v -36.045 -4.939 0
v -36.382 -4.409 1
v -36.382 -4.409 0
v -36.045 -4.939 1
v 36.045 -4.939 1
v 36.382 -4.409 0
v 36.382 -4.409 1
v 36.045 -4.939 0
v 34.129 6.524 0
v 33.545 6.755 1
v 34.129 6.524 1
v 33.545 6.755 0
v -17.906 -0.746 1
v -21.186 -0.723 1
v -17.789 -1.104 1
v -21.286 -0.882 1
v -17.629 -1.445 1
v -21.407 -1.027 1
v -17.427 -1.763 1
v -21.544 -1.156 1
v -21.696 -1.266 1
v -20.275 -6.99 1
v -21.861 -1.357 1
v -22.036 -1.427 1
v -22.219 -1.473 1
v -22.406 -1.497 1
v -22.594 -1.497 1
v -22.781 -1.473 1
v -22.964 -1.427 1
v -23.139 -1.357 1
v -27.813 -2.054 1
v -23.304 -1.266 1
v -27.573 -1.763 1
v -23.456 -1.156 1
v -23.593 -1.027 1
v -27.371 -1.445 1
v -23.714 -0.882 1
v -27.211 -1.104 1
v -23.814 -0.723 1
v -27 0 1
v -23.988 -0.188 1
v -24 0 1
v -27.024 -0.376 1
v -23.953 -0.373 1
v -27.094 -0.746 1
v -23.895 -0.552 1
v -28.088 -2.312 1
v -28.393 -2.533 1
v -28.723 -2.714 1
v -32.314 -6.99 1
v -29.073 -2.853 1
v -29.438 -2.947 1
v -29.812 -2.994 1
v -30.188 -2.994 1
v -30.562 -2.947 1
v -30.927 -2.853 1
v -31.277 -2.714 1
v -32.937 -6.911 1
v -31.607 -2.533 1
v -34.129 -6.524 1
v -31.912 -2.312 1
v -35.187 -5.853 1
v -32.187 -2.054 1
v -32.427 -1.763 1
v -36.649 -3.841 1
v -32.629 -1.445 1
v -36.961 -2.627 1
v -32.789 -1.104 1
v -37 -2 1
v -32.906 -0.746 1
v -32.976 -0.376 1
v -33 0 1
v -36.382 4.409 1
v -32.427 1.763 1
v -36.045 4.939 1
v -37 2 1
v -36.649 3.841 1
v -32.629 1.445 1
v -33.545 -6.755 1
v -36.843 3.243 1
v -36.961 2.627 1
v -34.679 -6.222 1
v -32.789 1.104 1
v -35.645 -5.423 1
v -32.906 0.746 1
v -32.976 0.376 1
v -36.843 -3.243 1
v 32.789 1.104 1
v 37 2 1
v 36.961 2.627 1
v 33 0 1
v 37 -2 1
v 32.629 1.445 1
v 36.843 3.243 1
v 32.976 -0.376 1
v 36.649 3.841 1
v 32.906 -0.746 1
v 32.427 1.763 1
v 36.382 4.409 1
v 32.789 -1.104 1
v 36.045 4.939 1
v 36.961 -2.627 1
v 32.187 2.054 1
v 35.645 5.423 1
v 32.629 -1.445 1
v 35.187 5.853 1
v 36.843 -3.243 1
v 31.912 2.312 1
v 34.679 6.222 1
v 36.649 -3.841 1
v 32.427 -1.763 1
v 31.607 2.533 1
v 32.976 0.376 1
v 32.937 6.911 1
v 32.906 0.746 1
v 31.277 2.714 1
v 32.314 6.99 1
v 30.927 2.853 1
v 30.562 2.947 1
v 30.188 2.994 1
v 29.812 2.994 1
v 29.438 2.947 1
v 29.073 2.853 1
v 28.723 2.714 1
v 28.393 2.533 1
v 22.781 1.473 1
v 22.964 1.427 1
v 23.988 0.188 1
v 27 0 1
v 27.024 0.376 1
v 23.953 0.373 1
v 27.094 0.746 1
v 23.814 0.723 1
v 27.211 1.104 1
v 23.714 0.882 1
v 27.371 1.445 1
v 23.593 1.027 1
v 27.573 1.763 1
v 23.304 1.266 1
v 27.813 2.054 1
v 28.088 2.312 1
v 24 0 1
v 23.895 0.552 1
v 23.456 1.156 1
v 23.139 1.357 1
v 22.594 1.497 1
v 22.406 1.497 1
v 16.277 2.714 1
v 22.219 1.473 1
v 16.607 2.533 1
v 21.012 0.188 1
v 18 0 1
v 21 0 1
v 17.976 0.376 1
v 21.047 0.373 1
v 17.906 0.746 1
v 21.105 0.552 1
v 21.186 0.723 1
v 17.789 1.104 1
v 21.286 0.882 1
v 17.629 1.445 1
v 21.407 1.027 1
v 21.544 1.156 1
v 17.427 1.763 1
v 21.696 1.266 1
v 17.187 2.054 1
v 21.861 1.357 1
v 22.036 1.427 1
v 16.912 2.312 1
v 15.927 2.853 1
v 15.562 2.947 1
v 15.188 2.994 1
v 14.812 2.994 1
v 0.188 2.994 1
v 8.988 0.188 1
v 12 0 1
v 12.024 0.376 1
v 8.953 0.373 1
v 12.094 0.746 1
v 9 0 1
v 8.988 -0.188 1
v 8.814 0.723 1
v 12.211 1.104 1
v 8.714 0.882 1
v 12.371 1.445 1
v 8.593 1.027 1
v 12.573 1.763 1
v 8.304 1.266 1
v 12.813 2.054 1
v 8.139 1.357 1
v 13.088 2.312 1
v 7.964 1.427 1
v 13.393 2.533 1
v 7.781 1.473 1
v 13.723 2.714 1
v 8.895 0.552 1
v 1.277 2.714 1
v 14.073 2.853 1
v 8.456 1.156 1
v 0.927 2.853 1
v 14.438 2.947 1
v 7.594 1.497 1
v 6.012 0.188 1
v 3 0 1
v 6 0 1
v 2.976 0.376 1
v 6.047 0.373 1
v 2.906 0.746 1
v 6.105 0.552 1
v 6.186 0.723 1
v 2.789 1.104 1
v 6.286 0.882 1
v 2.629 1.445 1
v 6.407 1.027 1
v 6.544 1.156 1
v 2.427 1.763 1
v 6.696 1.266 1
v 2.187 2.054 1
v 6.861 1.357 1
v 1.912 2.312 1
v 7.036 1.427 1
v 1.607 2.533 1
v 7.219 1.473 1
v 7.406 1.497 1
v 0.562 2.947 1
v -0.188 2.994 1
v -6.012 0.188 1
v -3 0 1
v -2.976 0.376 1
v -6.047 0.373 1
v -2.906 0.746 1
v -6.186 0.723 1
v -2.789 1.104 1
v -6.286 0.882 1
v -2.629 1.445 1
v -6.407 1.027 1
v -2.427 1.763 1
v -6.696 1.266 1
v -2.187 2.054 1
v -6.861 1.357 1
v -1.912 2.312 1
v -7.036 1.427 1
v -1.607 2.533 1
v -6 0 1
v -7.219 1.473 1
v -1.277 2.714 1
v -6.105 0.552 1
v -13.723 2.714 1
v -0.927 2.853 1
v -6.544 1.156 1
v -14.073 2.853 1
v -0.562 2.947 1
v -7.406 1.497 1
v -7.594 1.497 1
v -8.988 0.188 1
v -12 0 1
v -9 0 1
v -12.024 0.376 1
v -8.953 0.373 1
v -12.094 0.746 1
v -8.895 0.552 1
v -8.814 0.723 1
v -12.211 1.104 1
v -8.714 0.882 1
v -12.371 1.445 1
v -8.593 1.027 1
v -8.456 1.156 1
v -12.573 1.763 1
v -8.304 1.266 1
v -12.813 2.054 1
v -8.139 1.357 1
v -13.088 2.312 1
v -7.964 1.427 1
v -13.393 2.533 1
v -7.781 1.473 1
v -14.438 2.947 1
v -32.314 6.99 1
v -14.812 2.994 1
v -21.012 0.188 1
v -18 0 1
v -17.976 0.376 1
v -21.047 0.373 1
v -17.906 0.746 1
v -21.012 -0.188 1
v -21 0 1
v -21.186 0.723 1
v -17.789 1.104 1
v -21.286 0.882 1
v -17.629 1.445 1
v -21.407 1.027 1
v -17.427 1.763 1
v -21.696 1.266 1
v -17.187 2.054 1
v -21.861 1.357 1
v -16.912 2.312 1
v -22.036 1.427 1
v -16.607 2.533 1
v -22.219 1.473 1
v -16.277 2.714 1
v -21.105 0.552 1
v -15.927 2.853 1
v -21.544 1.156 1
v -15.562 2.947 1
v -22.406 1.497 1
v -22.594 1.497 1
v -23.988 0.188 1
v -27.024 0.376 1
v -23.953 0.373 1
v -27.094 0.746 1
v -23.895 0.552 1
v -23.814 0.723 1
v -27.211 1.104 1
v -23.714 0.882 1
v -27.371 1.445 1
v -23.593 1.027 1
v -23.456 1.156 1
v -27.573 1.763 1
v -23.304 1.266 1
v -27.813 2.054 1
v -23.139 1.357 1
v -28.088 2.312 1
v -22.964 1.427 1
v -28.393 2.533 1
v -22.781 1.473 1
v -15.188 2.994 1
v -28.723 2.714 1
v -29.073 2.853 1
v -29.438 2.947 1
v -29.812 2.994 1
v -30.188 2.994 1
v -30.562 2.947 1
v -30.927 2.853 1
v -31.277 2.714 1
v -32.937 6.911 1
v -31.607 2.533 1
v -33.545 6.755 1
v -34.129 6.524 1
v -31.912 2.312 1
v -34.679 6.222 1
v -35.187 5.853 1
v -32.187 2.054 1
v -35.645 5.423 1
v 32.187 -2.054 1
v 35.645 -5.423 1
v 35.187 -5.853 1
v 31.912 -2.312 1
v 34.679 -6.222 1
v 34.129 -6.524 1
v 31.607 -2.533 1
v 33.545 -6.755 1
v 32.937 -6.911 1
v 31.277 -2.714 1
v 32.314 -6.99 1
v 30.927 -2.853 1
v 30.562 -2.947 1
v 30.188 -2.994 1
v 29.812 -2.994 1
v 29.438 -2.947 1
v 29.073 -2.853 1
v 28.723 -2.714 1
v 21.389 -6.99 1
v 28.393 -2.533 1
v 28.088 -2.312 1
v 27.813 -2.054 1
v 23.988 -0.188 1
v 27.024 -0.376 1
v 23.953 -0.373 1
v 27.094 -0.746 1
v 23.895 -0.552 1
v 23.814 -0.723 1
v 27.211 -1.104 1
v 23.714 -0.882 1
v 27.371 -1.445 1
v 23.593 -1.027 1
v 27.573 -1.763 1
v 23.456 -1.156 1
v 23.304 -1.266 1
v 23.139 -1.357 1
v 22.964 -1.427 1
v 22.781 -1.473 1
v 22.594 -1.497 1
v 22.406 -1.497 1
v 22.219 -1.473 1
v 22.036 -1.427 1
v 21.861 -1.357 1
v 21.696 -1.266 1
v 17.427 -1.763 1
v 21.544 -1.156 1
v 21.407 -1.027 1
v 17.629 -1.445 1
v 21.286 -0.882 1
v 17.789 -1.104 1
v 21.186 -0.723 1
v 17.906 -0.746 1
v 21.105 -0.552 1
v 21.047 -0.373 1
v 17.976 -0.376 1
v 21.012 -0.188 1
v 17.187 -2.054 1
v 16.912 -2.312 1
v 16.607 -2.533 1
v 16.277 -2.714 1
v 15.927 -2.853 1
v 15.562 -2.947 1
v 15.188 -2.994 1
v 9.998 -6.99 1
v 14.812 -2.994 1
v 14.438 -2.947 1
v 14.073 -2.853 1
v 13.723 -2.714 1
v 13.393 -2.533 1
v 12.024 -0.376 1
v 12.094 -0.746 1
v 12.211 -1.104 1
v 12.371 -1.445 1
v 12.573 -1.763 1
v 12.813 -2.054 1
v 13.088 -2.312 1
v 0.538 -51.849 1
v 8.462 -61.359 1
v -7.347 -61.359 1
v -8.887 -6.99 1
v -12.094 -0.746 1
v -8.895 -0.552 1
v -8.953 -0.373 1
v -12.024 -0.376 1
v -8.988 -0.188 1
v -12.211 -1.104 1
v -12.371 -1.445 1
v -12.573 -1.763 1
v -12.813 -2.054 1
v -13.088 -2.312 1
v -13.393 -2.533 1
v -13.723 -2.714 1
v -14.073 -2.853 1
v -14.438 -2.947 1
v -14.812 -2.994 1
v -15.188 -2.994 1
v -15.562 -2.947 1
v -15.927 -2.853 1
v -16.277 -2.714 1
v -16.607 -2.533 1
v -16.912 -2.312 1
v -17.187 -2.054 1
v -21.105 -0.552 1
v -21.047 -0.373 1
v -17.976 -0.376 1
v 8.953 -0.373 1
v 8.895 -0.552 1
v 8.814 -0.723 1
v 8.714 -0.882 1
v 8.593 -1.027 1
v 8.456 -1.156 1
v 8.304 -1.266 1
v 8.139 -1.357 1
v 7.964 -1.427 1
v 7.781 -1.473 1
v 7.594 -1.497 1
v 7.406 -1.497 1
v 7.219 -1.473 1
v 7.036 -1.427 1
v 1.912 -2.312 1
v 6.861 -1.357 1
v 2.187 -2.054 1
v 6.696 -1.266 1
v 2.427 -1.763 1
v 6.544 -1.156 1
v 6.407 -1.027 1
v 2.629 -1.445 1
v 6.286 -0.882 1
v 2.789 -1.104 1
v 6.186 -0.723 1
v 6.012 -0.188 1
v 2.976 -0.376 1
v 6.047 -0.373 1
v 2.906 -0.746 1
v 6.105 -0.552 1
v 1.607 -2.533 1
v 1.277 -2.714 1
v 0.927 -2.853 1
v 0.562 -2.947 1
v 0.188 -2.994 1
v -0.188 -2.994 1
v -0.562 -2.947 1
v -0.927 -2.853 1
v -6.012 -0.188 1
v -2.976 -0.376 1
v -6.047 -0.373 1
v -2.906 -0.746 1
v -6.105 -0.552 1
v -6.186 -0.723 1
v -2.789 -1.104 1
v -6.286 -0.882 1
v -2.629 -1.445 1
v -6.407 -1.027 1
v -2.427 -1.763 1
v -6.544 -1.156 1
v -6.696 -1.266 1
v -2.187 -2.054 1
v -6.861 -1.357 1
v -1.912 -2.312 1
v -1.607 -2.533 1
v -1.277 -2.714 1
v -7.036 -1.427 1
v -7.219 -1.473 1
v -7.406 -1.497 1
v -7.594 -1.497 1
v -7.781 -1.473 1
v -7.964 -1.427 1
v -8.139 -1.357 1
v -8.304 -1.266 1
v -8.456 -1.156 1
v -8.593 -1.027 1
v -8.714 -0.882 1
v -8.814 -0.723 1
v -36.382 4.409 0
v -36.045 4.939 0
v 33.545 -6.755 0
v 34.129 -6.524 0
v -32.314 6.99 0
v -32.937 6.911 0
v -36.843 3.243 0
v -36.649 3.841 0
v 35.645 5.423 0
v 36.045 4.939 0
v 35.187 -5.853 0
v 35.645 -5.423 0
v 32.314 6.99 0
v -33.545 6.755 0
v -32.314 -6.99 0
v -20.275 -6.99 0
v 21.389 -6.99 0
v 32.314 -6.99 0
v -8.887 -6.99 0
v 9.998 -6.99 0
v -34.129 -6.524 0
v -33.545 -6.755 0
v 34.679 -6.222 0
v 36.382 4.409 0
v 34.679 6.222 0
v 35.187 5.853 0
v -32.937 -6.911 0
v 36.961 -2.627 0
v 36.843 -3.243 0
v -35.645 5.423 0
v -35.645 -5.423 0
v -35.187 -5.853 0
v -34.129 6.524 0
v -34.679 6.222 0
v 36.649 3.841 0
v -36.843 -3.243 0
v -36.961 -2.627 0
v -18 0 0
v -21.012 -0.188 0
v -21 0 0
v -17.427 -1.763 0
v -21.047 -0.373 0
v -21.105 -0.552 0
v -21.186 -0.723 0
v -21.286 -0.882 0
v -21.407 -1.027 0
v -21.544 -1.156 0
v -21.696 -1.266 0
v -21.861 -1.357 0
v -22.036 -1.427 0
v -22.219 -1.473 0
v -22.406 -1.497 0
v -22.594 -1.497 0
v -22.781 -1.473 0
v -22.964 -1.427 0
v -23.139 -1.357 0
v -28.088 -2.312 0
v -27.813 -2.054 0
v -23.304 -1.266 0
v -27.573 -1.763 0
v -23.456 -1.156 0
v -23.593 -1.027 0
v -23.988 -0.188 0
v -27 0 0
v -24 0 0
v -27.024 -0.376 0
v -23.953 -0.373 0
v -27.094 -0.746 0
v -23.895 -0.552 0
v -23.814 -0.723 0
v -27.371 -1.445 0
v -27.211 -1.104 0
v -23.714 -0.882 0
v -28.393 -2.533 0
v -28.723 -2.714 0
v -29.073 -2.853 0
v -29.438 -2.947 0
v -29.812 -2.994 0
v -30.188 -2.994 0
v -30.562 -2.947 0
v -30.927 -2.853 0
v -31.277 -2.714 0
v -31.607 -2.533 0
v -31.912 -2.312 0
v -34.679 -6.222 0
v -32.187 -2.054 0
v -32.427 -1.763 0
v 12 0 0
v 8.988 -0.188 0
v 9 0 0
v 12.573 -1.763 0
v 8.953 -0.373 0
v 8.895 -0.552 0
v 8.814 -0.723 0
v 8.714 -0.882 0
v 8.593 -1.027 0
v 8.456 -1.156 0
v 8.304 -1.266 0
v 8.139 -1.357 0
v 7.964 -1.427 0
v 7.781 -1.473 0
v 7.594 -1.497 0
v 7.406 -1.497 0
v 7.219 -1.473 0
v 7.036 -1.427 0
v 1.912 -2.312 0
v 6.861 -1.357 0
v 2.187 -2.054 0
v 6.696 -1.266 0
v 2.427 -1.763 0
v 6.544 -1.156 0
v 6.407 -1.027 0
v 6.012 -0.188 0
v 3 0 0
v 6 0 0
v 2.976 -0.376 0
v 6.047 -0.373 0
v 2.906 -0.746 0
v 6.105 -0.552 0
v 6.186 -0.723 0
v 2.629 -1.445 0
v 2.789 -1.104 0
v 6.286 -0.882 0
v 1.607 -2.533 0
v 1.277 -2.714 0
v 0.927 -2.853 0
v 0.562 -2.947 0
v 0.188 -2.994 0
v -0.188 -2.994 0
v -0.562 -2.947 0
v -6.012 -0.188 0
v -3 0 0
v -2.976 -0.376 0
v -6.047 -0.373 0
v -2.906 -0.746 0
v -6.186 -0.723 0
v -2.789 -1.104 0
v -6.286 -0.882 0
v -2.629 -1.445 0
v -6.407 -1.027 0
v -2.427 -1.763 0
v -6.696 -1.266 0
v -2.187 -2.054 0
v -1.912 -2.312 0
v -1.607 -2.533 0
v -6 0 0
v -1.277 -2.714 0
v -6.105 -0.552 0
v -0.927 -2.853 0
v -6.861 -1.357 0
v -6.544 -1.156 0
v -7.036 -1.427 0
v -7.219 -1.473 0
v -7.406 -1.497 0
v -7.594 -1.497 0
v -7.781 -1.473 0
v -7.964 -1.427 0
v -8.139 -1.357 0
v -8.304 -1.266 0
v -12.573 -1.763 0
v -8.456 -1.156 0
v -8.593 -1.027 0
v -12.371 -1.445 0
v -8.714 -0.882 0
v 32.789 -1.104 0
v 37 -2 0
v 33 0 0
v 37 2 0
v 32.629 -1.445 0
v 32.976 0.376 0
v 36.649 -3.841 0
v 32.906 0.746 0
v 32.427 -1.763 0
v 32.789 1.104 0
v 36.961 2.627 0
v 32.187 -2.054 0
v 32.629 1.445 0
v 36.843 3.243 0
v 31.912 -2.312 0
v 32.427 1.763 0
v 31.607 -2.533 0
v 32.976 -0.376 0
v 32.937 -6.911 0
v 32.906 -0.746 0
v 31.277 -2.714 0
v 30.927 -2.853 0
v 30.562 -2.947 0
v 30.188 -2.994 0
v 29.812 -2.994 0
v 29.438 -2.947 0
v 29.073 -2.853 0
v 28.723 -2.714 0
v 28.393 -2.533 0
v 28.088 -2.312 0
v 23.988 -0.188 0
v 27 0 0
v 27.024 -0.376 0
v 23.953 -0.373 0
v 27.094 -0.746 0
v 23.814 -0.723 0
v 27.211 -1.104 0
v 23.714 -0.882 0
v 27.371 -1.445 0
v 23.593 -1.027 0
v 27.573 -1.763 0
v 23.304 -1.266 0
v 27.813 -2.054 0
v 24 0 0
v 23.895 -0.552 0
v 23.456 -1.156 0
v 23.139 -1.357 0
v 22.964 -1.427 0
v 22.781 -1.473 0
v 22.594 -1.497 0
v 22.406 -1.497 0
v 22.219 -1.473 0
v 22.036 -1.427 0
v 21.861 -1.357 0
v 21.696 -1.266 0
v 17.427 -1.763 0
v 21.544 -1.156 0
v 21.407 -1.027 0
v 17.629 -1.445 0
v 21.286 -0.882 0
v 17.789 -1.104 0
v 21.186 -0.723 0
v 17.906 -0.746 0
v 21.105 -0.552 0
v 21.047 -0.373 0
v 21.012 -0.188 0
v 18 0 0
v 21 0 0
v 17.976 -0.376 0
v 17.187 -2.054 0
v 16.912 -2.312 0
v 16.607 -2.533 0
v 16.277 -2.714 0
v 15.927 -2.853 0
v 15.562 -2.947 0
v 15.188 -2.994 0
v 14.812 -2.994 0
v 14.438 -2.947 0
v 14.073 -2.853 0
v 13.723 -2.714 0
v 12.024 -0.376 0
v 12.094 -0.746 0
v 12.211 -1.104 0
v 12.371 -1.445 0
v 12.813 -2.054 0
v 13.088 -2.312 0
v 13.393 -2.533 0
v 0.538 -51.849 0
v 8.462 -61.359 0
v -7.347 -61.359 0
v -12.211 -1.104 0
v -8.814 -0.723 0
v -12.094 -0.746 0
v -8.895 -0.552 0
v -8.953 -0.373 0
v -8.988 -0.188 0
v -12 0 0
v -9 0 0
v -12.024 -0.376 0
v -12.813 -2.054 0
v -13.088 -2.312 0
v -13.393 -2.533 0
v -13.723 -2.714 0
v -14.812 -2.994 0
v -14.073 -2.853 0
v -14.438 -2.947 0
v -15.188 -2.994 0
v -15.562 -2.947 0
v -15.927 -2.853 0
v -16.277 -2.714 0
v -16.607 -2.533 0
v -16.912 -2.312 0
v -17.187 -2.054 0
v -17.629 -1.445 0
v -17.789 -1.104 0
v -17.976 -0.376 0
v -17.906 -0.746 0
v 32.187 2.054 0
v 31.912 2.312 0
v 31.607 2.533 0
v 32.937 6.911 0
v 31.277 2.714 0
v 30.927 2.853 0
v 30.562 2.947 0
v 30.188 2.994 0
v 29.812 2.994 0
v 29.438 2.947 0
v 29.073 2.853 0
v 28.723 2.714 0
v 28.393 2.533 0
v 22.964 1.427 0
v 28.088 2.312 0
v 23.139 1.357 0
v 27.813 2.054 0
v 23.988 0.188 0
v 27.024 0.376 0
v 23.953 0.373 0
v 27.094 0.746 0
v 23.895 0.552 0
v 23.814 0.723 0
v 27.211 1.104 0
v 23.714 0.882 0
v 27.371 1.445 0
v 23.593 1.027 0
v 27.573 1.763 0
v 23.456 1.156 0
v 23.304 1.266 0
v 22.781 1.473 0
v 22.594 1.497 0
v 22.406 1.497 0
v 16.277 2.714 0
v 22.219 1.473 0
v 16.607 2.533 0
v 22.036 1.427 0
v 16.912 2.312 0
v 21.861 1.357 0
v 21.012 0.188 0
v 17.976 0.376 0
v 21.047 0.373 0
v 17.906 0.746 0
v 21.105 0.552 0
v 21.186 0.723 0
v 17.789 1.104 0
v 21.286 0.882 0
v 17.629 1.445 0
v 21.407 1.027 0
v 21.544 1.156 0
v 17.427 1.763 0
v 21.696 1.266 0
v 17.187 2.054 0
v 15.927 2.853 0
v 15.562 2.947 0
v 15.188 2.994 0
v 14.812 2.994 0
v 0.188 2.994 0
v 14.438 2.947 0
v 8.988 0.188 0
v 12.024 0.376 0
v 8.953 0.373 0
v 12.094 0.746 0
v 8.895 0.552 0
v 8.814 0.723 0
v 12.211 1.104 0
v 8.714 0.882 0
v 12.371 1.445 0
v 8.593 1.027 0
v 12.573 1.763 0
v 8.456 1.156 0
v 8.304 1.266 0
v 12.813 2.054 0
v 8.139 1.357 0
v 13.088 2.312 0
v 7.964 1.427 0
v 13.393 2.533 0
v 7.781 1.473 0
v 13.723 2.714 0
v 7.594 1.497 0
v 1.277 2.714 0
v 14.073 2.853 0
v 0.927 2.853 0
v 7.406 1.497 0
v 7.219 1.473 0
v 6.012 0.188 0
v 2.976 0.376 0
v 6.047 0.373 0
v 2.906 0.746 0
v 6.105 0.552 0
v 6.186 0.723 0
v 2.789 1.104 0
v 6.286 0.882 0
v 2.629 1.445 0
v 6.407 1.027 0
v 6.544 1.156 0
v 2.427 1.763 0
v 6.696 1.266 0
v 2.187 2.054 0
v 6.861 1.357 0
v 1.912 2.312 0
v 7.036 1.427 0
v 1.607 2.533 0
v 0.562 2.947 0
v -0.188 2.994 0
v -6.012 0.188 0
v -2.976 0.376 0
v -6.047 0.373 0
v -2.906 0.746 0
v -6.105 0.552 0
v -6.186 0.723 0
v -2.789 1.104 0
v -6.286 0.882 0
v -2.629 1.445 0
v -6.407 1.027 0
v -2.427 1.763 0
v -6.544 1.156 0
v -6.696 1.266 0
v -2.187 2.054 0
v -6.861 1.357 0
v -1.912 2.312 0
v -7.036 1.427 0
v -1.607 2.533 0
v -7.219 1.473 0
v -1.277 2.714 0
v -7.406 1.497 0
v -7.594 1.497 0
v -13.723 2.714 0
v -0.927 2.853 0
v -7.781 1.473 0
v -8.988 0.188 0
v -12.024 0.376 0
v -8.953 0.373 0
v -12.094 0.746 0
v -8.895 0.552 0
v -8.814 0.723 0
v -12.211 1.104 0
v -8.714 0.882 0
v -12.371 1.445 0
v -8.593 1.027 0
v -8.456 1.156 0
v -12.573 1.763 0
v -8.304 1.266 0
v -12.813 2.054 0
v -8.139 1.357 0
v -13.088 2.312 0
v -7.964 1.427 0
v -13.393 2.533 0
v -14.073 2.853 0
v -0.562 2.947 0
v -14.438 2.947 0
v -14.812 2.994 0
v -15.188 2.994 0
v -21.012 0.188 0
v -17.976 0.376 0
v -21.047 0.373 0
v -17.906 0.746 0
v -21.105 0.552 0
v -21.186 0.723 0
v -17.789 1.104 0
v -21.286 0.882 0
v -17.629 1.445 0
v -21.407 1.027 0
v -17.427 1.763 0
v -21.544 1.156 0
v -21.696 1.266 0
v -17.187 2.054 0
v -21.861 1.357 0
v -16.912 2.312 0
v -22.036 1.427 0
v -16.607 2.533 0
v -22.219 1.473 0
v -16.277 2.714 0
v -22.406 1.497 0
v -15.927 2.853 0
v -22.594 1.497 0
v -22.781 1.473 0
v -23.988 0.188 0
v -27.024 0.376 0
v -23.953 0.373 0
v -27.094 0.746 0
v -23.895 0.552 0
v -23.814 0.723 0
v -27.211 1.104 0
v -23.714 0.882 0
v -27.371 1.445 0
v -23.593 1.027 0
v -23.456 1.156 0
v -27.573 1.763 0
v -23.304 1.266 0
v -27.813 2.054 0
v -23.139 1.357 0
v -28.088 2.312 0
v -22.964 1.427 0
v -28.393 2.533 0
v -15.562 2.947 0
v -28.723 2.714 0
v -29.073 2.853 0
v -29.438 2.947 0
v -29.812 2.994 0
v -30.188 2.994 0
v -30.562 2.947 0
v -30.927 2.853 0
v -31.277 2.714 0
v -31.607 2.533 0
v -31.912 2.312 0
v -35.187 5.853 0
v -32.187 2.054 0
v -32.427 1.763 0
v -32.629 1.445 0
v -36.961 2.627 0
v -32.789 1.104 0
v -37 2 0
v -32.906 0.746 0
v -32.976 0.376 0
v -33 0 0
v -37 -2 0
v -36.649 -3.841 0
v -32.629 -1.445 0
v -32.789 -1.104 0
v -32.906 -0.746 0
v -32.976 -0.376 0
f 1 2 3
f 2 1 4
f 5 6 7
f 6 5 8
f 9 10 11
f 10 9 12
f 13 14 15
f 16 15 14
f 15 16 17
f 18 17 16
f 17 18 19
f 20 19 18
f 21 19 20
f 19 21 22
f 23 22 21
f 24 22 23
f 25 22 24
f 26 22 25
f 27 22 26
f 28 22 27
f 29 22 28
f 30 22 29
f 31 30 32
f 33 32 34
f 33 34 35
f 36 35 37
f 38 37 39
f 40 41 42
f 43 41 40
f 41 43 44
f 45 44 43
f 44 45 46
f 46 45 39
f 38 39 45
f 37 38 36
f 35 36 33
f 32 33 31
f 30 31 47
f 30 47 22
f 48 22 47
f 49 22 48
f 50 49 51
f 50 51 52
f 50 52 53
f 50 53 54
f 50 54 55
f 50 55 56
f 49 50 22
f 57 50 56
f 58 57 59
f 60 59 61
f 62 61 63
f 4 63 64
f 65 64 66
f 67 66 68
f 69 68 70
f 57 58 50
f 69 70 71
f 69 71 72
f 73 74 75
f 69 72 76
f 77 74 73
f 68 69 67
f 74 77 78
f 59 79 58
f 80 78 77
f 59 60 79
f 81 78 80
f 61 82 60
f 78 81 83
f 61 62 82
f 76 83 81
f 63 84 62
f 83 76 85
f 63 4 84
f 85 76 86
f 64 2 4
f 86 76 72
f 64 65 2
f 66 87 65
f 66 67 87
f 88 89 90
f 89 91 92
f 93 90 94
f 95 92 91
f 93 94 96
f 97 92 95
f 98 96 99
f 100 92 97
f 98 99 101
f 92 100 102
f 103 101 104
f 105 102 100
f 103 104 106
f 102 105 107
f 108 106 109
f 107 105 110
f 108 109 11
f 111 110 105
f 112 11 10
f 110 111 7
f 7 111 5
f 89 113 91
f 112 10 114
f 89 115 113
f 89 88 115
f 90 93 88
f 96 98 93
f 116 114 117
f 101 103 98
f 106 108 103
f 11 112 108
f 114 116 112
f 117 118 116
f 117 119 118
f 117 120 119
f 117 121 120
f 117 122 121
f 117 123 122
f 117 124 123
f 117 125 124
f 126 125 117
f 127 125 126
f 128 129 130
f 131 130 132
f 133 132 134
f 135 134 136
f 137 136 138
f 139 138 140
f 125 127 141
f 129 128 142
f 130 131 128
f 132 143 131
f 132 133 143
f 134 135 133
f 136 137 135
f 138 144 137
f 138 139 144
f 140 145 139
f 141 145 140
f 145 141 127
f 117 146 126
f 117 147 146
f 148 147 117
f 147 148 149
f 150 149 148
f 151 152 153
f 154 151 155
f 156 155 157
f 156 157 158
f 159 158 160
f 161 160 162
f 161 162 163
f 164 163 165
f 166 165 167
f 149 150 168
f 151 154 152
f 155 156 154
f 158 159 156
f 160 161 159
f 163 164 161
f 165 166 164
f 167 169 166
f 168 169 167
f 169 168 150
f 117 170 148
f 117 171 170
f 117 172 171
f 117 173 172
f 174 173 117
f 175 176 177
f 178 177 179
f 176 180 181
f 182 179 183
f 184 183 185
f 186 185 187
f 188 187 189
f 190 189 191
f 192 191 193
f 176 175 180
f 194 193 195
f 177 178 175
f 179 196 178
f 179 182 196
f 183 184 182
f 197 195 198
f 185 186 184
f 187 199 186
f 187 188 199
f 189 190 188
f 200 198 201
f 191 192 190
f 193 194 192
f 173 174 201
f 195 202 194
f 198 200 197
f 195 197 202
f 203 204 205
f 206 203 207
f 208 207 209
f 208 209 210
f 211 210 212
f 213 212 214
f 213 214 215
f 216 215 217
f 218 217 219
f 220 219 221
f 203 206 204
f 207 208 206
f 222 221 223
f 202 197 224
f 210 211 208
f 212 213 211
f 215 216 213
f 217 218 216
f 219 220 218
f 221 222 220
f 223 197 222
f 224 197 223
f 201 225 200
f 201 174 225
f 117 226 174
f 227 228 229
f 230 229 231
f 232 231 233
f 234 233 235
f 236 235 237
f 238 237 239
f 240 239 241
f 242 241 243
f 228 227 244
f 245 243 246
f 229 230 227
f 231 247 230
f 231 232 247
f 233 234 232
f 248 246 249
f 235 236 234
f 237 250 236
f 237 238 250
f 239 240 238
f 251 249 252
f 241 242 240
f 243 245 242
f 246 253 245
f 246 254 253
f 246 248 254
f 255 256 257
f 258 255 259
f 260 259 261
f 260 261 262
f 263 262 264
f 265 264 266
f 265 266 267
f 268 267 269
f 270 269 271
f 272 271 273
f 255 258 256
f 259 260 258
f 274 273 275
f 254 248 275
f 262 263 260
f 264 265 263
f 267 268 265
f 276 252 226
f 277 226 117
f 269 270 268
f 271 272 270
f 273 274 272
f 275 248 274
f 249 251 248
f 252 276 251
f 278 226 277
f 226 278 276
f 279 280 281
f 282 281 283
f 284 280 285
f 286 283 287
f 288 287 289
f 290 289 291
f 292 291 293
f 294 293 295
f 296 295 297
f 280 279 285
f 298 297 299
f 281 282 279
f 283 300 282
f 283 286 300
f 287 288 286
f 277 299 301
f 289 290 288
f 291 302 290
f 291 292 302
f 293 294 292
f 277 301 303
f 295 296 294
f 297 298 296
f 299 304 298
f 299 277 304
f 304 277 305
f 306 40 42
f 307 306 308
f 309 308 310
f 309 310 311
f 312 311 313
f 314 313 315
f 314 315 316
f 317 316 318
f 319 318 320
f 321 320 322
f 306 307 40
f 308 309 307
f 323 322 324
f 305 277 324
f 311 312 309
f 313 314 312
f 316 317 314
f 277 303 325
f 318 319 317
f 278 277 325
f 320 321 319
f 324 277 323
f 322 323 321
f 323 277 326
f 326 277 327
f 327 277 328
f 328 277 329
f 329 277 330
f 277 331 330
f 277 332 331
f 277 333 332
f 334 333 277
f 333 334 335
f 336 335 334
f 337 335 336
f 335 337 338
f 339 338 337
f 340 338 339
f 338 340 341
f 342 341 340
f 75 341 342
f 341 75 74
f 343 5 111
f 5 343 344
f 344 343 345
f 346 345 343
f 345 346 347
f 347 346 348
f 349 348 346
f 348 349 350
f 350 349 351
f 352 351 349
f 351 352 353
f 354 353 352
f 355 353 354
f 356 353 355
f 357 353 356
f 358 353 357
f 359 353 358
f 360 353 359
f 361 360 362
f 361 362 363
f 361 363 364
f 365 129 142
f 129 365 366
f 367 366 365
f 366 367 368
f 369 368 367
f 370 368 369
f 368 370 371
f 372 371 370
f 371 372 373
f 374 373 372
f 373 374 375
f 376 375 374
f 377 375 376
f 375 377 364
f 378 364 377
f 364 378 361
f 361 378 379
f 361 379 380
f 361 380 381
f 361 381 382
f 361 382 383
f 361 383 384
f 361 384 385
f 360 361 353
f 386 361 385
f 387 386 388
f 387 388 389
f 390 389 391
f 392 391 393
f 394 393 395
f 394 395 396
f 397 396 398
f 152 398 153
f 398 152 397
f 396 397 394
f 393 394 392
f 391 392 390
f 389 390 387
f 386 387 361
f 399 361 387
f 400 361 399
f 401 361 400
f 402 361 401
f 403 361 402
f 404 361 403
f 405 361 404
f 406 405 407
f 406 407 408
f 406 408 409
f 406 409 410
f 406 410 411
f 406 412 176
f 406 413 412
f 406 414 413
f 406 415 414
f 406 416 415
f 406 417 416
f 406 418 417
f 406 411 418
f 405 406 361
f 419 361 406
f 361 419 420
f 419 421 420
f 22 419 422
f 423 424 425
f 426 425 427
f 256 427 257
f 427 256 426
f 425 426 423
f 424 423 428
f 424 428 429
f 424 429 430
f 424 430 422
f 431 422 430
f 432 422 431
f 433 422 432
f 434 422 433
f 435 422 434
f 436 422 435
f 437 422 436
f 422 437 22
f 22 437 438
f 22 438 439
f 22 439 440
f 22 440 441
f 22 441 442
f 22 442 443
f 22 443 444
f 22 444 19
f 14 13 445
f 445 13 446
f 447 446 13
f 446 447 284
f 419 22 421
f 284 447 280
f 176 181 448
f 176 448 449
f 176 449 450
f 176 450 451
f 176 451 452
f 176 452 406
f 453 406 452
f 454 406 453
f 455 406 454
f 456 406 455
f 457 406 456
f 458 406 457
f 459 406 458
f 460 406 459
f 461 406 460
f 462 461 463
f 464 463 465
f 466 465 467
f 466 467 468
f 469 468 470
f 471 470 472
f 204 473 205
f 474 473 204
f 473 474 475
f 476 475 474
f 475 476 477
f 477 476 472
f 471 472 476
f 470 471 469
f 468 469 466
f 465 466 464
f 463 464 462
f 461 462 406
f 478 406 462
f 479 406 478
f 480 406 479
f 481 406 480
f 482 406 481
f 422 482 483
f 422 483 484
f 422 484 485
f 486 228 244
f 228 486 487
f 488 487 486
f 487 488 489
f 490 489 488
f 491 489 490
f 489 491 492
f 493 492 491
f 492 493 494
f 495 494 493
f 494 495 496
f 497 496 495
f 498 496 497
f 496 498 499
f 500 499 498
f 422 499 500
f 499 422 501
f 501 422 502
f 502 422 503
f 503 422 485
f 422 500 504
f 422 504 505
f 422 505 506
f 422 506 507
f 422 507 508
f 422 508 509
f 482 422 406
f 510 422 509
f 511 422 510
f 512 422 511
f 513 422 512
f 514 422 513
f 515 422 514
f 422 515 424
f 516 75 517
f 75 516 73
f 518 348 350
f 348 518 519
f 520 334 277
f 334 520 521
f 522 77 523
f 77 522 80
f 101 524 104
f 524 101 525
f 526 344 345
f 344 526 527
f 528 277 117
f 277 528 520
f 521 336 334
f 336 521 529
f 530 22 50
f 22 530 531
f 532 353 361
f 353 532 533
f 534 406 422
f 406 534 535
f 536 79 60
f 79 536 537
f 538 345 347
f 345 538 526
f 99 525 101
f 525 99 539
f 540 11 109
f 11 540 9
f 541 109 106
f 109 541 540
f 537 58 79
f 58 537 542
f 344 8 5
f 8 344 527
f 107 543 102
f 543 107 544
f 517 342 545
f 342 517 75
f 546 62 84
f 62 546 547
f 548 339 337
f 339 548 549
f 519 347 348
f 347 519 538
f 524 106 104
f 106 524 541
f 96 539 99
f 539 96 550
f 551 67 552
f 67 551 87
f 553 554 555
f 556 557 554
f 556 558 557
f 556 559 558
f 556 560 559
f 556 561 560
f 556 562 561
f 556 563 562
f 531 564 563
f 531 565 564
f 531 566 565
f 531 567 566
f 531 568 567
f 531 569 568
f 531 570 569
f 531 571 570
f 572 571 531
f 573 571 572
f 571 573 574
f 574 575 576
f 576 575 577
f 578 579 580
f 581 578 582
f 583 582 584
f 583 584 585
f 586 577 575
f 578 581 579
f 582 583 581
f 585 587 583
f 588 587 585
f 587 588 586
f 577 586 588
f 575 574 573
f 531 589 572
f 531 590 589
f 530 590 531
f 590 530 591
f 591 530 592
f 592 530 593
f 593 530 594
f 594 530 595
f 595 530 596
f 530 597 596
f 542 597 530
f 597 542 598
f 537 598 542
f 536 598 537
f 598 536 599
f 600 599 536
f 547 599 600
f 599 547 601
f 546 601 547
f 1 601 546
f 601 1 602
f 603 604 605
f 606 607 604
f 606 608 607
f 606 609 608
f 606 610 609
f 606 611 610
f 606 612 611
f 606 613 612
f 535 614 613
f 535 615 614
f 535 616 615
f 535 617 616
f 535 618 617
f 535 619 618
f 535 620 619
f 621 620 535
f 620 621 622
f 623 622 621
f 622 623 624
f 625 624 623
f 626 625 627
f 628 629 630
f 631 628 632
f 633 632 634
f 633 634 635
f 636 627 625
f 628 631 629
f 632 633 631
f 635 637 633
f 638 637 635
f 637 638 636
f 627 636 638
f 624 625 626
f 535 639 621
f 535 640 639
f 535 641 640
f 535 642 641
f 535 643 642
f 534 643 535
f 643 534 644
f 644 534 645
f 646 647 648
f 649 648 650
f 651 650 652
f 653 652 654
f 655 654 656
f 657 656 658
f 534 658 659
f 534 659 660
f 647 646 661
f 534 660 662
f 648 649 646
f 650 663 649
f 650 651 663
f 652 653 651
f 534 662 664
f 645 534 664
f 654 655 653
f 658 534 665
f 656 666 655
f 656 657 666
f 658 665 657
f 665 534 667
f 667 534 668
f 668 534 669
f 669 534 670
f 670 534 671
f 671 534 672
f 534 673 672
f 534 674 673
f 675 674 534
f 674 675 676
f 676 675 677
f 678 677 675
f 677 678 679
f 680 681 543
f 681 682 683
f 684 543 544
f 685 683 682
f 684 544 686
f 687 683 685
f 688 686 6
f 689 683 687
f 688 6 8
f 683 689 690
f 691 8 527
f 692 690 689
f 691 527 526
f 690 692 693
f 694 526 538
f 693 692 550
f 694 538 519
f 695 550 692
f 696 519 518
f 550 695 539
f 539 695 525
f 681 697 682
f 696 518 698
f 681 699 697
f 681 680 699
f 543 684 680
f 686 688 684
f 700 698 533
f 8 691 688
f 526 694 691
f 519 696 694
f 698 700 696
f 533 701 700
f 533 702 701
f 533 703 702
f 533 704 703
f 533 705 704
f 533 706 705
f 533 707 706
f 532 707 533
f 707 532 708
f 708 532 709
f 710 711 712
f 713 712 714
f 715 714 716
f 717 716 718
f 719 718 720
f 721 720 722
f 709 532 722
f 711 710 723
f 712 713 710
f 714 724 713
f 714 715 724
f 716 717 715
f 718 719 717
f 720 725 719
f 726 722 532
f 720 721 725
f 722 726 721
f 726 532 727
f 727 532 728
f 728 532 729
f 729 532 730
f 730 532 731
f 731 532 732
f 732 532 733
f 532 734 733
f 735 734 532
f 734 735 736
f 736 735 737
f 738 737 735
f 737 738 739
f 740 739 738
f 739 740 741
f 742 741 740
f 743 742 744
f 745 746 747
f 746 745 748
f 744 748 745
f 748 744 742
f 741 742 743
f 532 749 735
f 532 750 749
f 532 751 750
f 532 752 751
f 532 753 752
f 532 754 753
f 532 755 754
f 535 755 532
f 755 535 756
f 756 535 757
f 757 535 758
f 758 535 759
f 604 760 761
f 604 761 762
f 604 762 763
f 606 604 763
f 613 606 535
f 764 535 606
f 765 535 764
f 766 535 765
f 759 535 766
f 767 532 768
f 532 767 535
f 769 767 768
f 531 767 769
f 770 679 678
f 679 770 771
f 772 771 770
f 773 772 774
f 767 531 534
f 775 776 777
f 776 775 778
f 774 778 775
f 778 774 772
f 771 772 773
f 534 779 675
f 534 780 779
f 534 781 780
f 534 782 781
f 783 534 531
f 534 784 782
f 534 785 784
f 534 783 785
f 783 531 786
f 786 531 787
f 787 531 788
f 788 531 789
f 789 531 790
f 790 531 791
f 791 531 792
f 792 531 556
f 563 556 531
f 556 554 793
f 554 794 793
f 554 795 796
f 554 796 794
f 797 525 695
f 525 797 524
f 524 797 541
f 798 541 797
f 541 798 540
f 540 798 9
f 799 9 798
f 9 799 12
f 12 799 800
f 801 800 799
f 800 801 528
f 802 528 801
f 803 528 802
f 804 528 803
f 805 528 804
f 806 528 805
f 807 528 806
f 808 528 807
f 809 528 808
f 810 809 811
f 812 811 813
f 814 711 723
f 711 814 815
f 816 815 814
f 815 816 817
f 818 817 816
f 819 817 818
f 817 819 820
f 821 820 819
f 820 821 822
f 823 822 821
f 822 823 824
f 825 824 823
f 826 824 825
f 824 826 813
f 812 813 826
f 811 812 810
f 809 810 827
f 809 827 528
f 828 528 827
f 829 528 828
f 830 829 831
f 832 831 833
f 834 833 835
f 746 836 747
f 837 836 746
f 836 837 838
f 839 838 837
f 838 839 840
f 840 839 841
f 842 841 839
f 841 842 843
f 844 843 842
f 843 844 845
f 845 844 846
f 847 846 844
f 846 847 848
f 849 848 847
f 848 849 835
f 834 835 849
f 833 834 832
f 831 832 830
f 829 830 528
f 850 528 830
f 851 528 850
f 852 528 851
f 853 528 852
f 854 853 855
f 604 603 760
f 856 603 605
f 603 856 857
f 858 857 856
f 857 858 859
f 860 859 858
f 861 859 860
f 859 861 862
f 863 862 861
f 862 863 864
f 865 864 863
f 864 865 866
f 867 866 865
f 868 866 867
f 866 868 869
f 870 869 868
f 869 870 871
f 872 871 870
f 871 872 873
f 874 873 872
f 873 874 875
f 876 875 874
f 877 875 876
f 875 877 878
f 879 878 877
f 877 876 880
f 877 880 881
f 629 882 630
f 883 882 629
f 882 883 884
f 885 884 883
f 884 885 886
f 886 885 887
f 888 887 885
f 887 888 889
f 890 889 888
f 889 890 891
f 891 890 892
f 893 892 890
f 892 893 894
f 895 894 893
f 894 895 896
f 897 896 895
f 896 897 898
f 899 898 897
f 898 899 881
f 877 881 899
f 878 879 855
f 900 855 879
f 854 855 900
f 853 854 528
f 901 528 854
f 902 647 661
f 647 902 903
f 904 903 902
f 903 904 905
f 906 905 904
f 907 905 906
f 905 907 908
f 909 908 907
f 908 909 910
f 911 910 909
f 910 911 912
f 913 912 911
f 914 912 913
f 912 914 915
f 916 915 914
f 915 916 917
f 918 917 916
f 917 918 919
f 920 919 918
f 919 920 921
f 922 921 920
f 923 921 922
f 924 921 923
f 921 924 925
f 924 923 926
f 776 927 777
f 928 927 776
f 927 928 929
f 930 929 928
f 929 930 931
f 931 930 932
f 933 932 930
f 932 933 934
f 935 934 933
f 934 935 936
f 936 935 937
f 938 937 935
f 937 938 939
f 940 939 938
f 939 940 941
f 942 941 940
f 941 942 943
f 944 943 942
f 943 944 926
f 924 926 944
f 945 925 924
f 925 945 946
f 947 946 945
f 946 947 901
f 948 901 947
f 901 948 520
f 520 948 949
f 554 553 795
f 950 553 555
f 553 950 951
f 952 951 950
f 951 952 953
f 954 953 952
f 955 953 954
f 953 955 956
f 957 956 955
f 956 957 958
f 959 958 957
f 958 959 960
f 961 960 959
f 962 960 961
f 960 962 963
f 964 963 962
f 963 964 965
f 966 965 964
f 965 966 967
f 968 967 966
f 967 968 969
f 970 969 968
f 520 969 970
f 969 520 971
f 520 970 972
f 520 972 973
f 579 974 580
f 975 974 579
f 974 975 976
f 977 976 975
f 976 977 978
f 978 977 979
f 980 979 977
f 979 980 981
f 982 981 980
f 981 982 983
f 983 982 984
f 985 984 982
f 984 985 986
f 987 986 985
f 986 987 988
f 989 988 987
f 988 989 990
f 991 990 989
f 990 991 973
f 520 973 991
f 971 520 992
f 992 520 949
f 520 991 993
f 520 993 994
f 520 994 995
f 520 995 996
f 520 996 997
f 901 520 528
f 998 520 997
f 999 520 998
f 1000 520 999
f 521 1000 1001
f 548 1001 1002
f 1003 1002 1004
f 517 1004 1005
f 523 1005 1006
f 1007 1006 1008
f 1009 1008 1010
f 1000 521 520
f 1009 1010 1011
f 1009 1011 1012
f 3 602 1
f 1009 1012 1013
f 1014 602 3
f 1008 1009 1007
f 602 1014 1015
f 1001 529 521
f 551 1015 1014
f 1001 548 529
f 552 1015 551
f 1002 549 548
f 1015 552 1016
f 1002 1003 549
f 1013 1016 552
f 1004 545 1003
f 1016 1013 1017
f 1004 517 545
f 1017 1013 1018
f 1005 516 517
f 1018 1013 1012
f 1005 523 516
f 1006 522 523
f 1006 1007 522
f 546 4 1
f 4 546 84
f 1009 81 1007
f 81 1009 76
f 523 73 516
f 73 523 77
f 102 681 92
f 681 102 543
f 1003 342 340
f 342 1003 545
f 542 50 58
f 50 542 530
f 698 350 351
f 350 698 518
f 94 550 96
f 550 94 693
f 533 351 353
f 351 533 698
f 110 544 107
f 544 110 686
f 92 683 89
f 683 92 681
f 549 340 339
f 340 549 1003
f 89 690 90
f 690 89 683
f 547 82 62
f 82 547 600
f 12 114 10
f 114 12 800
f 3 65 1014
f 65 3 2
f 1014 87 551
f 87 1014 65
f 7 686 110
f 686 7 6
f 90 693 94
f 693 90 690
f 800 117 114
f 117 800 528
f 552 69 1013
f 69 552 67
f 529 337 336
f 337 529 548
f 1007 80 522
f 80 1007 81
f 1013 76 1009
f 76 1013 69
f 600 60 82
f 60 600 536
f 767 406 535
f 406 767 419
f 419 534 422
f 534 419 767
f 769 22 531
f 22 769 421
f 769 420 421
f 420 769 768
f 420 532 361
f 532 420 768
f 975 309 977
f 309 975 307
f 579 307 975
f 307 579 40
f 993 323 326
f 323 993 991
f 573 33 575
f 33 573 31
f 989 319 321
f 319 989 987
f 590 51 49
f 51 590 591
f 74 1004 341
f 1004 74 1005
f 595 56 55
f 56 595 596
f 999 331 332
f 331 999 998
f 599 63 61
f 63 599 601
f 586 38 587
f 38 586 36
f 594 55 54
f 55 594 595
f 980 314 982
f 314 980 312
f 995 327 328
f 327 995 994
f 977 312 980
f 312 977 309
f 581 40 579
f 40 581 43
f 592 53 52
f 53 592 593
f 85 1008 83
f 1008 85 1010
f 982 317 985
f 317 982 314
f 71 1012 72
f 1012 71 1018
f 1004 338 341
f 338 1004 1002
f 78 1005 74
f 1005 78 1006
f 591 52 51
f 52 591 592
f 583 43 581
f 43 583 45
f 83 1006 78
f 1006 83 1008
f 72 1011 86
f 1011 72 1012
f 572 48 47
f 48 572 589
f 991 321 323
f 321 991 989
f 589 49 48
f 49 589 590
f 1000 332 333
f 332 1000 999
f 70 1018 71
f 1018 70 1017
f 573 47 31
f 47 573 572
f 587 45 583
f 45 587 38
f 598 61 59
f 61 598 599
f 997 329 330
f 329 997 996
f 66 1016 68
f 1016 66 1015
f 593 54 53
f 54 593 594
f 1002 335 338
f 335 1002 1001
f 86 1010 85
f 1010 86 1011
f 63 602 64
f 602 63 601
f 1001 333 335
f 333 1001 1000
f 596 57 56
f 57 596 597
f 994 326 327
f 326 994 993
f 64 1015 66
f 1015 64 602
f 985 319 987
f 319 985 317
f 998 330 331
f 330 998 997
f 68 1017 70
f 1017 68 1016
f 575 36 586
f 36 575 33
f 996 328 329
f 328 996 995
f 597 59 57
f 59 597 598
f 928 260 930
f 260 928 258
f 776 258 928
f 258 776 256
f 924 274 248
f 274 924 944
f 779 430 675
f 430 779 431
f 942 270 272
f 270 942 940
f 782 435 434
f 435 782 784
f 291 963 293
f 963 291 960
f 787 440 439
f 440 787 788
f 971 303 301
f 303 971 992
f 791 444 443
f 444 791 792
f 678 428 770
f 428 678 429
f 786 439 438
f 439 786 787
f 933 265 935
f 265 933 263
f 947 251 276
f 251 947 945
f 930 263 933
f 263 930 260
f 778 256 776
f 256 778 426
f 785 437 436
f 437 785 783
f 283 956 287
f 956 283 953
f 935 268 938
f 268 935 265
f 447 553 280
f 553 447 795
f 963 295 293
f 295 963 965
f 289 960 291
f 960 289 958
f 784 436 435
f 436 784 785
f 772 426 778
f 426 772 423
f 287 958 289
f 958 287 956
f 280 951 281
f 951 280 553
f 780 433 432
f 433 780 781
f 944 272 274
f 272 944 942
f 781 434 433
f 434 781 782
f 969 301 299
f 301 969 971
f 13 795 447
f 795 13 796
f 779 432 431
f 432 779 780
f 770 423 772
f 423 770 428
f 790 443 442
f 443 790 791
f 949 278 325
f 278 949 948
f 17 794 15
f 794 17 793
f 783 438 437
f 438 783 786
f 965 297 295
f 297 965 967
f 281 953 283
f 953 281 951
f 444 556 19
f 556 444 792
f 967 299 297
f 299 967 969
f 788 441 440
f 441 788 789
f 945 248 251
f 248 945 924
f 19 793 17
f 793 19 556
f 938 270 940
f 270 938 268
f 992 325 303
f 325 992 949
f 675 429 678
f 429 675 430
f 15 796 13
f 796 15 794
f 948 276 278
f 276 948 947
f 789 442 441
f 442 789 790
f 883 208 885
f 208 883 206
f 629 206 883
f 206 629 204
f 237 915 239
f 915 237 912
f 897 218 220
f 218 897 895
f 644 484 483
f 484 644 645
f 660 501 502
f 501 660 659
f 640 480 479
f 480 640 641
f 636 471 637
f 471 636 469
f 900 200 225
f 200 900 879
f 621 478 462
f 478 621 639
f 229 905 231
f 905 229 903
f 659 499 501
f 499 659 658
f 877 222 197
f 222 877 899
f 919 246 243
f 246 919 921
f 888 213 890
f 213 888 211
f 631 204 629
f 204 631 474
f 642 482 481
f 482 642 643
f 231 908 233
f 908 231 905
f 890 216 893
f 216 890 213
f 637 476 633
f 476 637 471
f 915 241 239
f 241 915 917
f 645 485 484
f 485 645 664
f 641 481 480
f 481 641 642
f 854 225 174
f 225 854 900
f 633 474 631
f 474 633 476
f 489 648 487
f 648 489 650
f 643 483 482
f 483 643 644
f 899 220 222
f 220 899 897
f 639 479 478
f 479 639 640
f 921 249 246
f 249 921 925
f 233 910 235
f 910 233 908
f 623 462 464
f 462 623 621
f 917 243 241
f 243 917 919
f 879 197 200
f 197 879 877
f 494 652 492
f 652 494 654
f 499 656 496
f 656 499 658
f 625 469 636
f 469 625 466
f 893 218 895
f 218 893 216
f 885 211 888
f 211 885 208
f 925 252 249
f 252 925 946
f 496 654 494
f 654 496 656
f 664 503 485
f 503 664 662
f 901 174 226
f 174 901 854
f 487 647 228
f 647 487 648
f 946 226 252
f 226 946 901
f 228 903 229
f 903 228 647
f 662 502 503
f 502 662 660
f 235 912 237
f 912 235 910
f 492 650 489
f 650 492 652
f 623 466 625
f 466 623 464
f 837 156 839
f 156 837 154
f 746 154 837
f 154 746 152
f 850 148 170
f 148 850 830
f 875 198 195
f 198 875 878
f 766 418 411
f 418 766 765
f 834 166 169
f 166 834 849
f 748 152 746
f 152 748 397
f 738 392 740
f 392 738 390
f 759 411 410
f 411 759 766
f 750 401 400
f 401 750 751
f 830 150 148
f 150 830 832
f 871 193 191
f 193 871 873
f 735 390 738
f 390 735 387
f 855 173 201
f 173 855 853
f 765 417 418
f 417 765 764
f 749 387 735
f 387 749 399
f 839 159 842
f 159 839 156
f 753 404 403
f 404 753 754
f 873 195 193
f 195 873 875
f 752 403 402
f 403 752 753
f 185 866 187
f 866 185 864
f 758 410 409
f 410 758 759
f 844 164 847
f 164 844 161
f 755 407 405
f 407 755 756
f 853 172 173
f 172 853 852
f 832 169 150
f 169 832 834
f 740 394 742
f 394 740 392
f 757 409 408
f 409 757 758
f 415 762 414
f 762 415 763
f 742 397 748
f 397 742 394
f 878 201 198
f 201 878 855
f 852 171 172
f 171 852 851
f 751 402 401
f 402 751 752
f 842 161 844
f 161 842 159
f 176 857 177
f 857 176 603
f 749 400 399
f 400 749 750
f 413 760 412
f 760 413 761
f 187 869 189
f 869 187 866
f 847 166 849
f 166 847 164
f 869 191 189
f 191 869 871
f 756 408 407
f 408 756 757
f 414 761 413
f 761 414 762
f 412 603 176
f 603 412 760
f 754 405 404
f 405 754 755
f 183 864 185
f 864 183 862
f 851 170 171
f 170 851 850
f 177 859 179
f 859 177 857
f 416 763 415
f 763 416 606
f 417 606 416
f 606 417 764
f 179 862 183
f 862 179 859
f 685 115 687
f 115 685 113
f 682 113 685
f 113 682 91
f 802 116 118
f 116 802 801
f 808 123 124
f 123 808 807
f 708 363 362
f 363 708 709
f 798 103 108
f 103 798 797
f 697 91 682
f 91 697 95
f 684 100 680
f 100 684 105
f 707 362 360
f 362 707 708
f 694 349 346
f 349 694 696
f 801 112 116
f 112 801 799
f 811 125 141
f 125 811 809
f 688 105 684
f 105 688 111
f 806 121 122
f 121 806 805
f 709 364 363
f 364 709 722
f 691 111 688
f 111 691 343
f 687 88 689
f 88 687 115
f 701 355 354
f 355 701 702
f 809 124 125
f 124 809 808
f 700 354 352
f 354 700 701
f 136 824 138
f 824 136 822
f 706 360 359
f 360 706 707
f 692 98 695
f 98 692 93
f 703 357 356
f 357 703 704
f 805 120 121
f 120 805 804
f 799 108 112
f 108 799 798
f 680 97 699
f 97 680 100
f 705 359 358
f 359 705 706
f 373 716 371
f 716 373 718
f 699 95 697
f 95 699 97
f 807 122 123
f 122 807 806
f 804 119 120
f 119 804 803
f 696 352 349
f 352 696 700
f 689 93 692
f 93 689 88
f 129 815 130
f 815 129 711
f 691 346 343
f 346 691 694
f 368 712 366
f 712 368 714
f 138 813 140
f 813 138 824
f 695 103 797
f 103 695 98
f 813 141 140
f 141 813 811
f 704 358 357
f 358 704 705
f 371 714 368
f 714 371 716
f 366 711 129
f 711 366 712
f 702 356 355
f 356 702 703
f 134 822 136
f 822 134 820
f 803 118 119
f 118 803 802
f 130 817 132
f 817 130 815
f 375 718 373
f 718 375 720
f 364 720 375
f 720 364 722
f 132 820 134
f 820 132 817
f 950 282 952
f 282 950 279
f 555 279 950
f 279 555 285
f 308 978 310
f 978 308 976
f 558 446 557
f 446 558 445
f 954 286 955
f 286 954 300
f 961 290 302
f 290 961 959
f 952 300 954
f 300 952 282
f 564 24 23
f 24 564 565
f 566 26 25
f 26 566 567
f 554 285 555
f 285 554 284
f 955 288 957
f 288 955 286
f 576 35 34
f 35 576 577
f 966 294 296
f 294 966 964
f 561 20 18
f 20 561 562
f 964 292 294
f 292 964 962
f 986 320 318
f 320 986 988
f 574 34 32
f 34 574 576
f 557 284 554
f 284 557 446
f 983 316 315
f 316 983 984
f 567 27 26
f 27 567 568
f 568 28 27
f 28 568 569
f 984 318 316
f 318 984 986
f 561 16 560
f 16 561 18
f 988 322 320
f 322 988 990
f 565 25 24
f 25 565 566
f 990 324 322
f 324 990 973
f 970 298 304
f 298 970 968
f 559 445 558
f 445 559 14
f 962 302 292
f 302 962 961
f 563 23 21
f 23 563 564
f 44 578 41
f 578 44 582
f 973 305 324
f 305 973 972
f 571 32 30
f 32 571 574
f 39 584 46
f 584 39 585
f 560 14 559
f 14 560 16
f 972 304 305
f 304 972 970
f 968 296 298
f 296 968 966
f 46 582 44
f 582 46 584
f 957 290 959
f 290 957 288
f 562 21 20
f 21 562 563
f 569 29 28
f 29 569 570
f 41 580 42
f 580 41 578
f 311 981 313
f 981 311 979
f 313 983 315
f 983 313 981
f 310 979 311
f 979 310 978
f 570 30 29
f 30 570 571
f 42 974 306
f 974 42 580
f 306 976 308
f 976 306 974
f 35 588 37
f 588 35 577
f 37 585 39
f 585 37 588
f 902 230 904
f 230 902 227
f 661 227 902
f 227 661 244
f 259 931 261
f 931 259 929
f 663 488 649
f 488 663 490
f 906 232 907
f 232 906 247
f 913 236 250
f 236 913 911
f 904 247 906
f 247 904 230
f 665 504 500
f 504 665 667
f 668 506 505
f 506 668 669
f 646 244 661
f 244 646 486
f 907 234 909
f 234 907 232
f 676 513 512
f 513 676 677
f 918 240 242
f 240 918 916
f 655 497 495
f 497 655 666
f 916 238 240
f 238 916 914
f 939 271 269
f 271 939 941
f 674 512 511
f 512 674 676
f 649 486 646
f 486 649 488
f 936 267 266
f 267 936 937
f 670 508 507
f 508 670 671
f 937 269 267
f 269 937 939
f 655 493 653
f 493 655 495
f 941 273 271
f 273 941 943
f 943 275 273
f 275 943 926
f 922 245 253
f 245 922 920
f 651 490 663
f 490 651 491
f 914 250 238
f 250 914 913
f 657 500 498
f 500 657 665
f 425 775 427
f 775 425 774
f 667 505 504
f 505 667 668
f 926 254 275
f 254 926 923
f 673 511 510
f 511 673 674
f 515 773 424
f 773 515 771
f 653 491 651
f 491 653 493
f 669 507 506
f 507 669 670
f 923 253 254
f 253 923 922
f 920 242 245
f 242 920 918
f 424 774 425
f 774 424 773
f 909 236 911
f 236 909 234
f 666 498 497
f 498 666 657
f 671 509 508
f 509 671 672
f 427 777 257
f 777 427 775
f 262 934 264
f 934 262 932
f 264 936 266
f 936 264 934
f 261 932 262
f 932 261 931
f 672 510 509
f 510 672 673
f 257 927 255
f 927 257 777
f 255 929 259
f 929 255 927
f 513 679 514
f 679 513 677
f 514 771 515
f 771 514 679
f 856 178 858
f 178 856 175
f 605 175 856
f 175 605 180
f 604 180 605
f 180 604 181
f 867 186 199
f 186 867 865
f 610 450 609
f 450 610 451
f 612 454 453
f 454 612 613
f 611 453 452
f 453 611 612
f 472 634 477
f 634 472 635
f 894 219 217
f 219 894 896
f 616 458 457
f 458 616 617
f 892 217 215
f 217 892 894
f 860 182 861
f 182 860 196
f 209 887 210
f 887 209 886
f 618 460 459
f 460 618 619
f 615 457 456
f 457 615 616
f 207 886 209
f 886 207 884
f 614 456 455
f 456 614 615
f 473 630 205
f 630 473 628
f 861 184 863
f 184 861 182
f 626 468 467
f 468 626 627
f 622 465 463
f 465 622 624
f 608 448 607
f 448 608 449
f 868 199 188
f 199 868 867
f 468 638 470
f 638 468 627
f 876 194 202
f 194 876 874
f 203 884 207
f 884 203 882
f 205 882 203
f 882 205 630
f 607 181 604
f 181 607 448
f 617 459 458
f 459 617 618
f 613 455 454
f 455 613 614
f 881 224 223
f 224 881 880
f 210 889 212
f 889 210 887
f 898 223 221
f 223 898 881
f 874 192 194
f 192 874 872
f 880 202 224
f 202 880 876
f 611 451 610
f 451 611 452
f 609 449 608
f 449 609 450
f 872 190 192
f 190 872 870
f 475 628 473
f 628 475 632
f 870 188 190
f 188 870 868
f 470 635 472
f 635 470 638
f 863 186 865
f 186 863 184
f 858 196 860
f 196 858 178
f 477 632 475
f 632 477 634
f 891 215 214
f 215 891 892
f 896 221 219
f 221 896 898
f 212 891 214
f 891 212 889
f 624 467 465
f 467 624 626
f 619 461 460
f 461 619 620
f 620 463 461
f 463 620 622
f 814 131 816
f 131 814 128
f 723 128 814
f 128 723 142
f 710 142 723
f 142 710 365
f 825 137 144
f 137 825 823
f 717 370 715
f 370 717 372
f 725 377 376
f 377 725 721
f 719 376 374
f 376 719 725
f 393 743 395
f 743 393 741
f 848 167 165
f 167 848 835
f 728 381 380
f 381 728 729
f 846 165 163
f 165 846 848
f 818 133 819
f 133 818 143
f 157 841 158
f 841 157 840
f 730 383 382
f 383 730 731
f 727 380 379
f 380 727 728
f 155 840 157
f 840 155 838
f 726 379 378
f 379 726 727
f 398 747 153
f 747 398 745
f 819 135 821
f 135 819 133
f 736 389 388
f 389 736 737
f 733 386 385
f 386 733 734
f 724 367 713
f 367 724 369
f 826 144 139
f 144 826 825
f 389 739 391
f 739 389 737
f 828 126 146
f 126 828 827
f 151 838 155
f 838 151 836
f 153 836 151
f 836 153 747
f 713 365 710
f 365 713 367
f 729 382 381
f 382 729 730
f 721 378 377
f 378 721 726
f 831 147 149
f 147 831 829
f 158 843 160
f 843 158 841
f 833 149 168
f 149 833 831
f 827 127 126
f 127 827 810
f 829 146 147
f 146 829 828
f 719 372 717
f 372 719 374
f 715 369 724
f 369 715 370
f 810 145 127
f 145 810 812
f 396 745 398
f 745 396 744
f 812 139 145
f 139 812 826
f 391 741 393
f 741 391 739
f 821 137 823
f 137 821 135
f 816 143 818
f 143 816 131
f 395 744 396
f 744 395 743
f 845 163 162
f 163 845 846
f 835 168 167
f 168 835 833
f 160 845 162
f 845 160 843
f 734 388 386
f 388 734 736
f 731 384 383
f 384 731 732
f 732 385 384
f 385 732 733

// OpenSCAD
$fn = 50;


difference() {
	union() {
		*color(alpha = 1.0000000000, c = "gray") {
			translate(v = [0, 14, 0]) {
				linear_extrude(height = 1) {
					text(font = "Arial:style=Bold", halign = "center", size = 4.5000000000, text = "COMMENT description oobb_plate_shape_p_type_1_depth_5_width_1_thickness_v_extra_oobb_size", valign = "center");
				}
			}
		}
		hull() {
			translate(v = [-32.0000000000, 2.0000000000, 0]) {
				cylinder(h = 1, r = 5);
			}
			translate(v = [32.0000000000, 2.0000000000, 0]) {
				cylinder(h = 1, r = 5);
			}
			translate(v = [-32.0000000000, -2.0000000000, 0]) {
				cylinder(h = 1, r = 5);
			}
			translate(v = [32.0000000000, -2.0000000000, 0]) {
				cylinder(h = 1, r = 5);
			}
		}
		translate(v = [0, -5, 0]) {
			linear_extrude(height = 1) {
				text(font = "DejaVu Sans Mono:style=Bold", halign = "center", size = 57.0000000000, text = "V", valign = "top");
			}
		}
	}
	union() {
		*color(alpha = 1.0000000000, c = "gray") {
			translate(v = [0, 14, 0]) {
				linear_extrude(height = 1) {
					text(font = "Arial:style=Bold", halign = "center", size = 4.5000000000, text = "COMMENT description oobb_holes_shape_n_type_5_width_1_thickness_v_extra_oobb_size_1_height_'all'_holes_true_both_holes", valign = "center");
				}
			}
		}
		translate(v = [-30.0000000000, 0.0000000000, 0]) {
			translate(v = [0, 0, -50]) {
				cylinder(h = 100, r = 3.0000000000);
			}
		}
		translate(v = [-15.0000000000, 0.0000000000, 0]) {
			translate(v = [0, 0, -50]) {
				cylinder(h = 100, r = 3.0000000000);
			}
		}
		translate(v = [0, 0, -50]) {
			cylinder(h = 100, r = 3.0000000000);
		}
		translate(v = [15.0000000000, 0.0000000000, 0]) {
			translate(v = [0, 0, -50]) {
				cylinder(h = 100, r = 3.0000000000);
			}
		}
		translate(v = [30.0000000000, 0.0000000000, 0]) {
			translate(v = [0, 0, -50]) {
				cylinder(h = 100, r = 3.0000000000);
			}
		}
		translate(v = [-30.0000000000, 0.0000000000, 0]) {
			translate(v = [0, 0, -50]) {
				cylinder(h = 100, r = 1.5000000000);
			}
		}
		translate(v = [-22.5000000000, 0.0000000000, 0]) {
			translate(v = [0, 0, -50]) {
				cylinder(h = 100, r = 1.5000000000);
			}
		}
		translate(v = [-15.0000000000, 0.0000000000, 0]) {
			translate(v = [0, 0, -50]) {
				cylinder(h = 100, r = 1.5000000000);
			}
		}
		translate(v = [-7.5000000000, 0.0000000000, 0]) {
			translate(v = [0, 0, -50]) {
				cylinder(h = 100, r = 1.5000000000);
			}
		}
		translate(v = [0, 0, -50]) {
			cylinder(h = 100, r = 1.5000000000);
		}
		translate(v = [7.5000000000, 0.0000000000, 0]) {
			translate(v = [0, 0, -50]) {
				cylinder(h = 100, r = 1.5000000000);
			}
		}
		translate(v = [15.0000000000, 0.0000000000, 0]) {
			translate(v = [0, 0, -50]) {
				cylinder(h = 100, r = 1.5000000000);
			}
		}
		translate(v = [22.5000000000, 0.0000000000, 0]) {
			translate(v = [0, 0, -50]) {
				cylinder(h = 100, r = 1.5000000000);
			}
		}
		translate(v = [30.0000000000, 0.0000000000, 0]) {
			translate(v = [0, 0, -50]) {
				cylinder(h = 100, r = 1.5000000000);
			}
		}
	}
}
